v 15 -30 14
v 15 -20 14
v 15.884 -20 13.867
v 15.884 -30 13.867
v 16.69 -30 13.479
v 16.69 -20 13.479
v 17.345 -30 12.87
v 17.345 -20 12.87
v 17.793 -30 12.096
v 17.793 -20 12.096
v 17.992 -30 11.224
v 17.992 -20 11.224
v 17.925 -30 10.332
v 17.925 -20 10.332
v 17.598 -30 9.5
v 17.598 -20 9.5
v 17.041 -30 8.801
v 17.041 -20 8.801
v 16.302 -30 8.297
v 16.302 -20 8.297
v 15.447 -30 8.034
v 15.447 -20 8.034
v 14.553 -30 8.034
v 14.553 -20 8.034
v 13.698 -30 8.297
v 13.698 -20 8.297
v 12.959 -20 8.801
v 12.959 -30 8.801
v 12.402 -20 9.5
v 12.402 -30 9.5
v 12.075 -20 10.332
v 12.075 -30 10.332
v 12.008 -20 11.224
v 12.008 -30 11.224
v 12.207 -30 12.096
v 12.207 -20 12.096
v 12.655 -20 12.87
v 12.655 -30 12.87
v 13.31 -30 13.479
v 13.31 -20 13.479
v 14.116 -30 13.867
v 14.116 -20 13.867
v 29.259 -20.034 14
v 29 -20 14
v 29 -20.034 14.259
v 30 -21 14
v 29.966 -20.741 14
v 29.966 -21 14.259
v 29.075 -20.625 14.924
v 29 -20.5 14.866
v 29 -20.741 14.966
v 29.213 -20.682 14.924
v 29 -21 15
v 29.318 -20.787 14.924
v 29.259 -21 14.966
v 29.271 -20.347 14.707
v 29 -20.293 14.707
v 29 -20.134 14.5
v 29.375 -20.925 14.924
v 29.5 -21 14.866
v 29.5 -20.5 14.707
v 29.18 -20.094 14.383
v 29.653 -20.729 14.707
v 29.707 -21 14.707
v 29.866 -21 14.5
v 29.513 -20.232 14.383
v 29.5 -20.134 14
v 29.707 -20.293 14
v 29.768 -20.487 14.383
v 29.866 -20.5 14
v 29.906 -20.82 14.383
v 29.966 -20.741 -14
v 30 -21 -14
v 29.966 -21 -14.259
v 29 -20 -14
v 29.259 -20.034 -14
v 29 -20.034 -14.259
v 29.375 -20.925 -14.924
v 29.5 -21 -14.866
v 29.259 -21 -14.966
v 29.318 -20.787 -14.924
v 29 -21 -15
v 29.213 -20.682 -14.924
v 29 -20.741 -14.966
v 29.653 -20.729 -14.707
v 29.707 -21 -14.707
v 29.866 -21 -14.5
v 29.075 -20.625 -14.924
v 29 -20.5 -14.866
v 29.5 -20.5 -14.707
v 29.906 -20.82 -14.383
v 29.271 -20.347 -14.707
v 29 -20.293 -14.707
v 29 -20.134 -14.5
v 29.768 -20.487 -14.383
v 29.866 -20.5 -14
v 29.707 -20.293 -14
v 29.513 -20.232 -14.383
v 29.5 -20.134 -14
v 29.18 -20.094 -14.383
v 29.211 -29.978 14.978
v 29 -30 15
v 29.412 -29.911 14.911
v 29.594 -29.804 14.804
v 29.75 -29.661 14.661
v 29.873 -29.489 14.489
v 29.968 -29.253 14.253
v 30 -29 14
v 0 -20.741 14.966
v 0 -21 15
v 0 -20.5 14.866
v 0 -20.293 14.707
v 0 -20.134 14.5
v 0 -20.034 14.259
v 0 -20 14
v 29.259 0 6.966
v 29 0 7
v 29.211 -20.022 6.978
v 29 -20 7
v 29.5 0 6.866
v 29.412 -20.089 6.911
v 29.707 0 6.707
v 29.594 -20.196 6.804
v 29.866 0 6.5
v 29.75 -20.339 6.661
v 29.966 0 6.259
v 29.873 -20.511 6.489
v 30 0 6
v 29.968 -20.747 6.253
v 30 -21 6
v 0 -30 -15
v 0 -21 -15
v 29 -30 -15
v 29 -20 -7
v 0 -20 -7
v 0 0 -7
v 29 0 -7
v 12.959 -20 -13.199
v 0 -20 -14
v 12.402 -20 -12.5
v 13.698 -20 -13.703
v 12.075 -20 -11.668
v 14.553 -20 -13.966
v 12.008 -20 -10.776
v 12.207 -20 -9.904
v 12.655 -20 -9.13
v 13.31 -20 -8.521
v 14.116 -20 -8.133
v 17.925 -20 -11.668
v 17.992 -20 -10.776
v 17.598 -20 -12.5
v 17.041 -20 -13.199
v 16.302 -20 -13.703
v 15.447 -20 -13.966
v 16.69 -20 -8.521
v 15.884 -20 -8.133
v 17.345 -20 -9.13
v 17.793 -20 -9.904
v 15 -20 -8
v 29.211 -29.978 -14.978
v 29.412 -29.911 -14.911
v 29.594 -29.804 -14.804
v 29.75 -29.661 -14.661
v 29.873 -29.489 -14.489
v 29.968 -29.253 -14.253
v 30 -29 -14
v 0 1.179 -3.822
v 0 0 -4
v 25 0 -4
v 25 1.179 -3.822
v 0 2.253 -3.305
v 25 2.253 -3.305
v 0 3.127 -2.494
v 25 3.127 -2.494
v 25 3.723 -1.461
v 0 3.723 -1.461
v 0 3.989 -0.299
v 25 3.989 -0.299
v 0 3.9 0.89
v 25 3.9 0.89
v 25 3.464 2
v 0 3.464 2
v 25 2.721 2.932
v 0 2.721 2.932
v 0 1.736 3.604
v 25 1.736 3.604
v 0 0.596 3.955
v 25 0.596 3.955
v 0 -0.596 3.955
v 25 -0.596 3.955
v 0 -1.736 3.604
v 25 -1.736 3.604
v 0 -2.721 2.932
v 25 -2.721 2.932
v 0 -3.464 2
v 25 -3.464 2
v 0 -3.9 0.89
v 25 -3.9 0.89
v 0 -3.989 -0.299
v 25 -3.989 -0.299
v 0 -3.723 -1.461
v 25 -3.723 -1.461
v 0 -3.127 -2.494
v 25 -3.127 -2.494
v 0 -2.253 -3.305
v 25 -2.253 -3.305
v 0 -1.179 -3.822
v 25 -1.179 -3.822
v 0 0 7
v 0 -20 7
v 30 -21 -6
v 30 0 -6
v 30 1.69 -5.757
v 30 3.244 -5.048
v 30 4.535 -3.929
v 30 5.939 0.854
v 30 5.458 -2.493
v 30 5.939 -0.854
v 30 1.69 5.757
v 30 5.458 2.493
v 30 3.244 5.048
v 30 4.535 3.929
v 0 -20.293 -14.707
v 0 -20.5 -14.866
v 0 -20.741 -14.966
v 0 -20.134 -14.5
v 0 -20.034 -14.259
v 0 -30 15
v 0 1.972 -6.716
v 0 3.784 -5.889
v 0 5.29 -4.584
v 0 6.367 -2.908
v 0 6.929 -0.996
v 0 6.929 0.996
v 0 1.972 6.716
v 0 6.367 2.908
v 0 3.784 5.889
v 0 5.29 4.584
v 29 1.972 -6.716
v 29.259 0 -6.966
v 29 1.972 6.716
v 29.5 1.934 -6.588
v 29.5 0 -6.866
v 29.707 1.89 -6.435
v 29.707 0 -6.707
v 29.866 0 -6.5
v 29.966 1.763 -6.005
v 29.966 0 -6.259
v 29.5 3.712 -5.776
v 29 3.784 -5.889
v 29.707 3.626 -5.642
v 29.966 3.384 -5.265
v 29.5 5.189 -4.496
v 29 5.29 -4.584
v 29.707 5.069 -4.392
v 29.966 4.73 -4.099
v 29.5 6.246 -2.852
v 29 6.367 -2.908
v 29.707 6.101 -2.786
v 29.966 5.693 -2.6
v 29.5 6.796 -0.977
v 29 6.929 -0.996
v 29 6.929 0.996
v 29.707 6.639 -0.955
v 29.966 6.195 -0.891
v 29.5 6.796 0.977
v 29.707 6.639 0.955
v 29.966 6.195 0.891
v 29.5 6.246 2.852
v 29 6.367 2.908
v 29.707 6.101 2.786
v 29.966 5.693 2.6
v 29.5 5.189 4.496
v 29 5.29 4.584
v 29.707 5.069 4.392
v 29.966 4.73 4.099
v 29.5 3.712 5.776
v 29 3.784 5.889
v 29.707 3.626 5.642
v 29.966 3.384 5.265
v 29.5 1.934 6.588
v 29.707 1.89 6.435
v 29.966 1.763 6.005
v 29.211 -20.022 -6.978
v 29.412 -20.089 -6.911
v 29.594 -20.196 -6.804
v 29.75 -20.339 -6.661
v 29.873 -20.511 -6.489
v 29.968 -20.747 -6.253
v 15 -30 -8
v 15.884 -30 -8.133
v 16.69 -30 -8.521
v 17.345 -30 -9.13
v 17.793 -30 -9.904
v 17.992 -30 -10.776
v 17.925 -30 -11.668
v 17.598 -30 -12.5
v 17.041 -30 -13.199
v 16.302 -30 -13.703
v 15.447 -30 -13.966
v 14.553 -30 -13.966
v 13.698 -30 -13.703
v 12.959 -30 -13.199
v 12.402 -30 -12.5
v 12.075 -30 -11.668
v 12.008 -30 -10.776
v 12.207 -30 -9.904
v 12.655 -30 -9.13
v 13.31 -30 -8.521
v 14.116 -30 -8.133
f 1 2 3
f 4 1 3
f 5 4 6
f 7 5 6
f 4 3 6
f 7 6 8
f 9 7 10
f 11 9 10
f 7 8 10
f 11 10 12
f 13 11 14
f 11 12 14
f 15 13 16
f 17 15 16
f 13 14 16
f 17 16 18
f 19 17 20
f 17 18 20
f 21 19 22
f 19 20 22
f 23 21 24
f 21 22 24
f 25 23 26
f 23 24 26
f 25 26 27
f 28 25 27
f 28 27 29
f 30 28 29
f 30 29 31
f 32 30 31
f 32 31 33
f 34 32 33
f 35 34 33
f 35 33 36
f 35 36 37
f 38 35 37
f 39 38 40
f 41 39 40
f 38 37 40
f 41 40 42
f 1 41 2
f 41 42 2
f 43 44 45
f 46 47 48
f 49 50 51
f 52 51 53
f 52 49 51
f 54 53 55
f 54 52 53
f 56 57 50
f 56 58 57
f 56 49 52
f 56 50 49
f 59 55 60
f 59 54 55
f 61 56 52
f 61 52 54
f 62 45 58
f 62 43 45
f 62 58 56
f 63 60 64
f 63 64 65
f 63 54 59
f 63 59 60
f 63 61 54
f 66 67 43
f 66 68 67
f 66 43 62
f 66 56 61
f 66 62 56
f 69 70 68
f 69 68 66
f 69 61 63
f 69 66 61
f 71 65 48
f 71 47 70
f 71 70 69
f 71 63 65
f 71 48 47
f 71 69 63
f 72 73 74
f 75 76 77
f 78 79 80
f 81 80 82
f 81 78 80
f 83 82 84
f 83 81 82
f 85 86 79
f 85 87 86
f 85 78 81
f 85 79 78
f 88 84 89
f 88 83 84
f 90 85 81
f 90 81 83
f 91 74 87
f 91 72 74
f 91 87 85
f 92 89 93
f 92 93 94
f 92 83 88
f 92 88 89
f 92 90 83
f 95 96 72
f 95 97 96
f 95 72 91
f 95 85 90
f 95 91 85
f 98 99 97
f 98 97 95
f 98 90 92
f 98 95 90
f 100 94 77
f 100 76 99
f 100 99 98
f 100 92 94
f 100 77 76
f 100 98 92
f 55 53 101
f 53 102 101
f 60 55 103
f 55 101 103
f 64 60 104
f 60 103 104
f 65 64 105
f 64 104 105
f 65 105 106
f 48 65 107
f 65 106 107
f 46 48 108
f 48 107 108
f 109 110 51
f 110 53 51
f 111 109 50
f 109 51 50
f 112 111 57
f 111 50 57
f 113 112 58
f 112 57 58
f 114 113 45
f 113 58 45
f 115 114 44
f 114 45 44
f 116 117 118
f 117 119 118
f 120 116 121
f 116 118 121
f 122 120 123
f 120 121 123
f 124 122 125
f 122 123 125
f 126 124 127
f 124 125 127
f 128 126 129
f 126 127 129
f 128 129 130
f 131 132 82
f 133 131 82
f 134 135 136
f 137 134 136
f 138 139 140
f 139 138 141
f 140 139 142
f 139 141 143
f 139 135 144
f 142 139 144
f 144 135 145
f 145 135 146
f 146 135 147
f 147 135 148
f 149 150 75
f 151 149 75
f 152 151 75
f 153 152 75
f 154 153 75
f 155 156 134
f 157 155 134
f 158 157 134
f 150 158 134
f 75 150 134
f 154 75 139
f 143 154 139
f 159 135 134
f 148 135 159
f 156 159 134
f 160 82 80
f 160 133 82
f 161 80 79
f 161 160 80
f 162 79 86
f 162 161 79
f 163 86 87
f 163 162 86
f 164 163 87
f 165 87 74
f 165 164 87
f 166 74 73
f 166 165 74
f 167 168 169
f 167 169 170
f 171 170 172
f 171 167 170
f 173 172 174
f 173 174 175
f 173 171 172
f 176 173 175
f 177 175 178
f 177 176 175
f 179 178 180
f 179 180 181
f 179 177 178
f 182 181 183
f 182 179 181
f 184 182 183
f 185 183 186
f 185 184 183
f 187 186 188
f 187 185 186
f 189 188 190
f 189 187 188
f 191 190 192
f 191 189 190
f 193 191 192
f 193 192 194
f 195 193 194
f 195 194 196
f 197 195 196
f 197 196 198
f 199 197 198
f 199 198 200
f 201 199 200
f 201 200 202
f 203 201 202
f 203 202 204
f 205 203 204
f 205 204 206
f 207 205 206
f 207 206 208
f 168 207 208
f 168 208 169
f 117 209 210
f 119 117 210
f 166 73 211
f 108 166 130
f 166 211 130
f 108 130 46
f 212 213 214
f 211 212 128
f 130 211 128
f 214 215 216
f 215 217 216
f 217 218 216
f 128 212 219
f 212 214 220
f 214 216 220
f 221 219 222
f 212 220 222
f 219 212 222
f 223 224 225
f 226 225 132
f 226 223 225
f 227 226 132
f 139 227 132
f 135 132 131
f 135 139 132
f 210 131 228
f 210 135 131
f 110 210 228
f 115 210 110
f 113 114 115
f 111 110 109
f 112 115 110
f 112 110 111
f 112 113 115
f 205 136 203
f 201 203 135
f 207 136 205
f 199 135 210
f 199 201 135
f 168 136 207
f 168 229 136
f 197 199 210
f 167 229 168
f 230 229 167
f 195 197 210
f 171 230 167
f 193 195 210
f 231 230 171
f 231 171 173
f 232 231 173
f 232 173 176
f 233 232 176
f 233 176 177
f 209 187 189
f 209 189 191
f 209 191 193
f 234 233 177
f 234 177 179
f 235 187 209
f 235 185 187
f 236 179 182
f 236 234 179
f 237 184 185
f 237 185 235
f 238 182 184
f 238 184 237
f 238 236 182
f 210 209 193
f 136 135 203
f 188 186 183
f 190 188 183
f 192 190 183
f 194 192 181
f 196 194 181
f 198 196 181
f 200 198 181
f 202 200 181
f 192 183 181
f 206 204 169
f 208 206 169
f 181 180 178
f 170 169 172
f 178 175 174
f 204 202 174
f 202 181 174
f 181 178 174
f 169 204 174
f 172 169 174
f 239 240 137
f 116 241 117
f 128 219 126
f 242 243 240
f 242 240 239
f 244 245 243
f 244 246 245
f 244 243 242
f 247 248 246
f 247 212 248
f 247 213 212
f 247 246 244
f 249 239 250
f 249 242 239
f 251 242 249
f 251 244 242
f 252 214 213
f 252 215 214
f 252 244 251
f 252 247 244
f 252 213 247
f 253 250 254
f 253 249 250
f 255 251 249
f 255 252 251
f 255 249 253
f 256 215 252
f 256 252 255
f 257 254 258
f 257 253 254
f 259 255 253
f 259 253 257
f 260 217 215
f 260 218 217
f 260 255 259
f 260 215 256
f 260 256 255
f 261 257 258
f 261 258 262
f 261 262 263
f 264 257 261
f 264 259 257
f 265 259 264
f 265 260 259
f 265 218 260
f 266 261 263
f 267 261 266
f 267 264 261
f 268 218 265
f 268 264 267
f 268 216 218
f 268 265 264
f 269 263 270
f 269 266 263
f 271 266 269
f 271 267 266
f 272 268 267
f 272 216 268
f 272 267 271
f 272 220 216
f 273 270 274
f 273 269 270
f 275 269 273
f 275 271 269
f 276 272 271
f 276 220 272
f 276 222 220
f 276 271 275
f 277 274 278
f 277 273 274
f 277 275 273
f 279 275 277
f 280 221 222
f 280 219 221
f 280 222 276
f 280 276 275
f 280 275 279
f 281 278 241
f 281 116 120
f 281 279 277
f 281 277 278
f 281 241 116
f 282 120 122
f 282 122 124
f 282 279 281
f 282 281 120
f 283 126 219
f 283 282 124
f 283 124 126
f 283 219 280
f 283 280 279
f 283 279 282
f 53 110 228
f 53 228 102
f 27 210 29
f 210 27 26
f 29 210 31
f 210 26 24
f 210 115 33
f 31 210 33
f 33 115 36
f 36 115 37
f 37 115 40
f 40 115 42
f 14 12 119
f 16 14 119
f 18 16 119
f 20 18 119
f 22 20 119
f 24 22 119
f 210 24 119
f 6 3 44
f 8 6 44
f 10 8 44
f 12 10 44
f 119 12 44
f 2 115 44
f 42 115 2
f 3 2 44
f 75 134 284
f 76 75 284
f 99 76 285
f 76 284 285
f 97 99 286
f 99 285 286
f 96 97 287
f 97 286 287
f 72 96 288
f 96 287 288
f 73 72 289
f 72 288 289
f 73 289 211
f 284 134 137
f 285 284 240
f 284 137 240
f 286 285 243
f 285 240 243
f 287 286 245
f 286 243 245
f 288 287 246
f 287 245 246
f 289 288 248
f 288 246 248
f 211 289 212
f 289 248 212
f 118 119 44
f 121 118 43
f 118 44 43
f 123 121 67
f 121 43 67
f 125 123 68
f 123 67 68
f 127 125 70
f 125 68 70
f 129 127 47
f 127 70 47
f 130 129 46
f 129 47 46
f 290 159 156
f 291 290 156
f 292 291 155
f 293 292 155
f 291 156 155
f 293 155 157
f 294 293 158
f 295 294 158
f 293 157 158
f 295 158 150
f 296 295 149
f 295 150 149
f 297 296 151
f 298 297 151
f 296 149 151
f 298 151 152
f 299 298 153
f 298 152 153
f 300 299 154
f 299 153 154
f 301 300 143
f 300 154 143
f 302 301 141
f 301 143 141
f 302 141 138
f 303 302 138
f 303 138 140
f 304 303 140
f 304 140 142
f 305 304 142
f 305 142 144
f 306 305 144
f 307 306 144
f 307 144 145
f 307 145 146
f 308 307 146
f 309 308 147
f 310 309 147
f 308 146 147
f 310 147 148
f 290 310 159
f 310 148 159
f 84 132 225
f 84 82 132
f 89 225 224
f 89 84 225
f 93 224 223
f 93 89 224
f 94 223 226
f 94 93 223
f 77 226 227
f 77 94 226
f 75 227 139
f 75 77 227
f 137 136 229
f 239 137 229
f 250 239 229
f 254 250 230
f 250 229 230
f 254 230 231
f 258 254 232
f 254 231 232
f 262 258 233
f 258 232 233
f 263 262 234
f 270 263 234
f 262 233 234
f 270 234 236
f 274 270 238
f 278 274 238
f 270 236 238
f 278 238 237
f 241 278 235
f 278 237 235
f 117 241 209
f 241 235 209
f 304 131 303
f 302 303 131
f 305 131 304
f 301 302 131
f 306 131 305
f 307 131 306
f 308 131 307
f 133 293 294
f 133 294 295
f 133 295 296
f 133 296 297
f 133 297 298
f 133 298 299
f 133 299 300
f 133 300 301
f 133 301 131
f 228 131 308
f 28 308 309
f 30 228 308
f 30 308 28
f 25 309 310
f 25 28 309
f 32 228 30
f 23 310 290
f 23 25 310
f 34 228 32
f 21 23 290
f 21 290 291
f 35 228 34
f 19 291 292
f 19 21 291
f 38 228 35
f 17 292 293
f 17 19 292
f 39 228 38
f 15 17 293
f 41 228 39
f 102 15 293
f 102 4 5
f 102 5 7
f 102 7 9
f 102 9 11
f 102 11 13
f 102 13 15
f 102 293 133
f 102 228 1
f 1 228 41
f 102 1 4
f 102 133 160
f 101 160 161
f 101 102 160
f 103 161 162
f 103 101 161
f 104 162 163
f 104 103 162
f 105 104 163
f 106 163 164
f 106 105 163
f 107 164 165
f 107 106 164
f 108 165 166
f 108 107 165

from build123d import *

# Parameters (mm, degrees)
SKETCH1_R           = 4
BOSS_EXTRUDE3_DEPTH = 30
SKETCH3_W           = 30.000000000000004
SKETCH3_H           = 30
BOSS_EXTRUDE4_DEPTH = 10
SKETCH4_R           = 3.0000000000000004
CUT_EXTRUDE1_DEPTH  = 10
BOSS_EXTRUDE5_START = -5
SKETCH5_R           = 4
BOSS_EXTRUDE5_DEPTH = 5
FILLET2_R           = 1


with BuildPart() as part:
    # Sketch1 → Boss-Extrude3 (new body)
    with BuildSketch(Plane(origin=(0, 0, 0), x_dir=(0, 0, -1), z_dir=(1, 0, 0))):
        with BuildLine():
            Line((-6.999999999999999, 0), (-6.9999999999999964, -20))
            Line((-6.9999999999999964, -20), (6.9999999999999964, -20))
            Line((6.9999999999999964, -20), (6.999999999999999, 0))
            ThreePointArc((6.999999999999999, 0), (4.3e-16, 6.999999999999999), (-6.999999999999999, 0))
        make_face()
        Circle(SKETCH1_R, mode=Mode.SUBTRACT)
    extrude(amount=BOSS_EXTRUDE3_DEPTH)

    # Sketch3 → Boss-Extrude4 (add)
    with BuildSketch(Plane.XZ.offset(20)):
        with Locations((15.000000000000002, 1.78e-15)):
            Rectangle(SKETCH3_W, SKETCH3_H)
    extrude(amount=BOSS_EXTRUDE4_DEPTH)

    # Sketch4 → Cut-Extrude1 (cut)
    with BuildSketch(Plane(origin=(0, -20, 0), x_dir=(1, 0, 0), z_dir=(0, 1, 0))):
        with Locations((15, 10.999999999999996)):
            Circle(SKETCH4_R)
        with Locations((15, -11)):
            Circle(SKETCH4_R)
    extrude(amount=-CUT_EXTRUDE1_DEPTH, mode=Mode.SUBTRACT)

    # Sketch5 → Boss-Extrude5 (add)
    with BuildSketch(Plane(origin=(30, 0, 0), x_dir=(0, 0, -1), z_dir=(1, 0, 0)).offset(BOSS_EXTRUDE5_START)):
        Circle(SKETCH5_R)
    extrude(amount=BOSS_EXTRUDE5_DEPTH)

    # Fillet2
    fillet2_edges = [part.edges().sort_by_distance(p)[0] for p in [
        (30, -10, -6.999999999999998),
        (30, -20, -10.999999999999996),
        (30, -25, -14.999999999999998),
        (30, -30, 1.78e-15),
        (30, -25, 15.000000000000002),
        (30, -20, 10.999999999999998),
        (30, -10, 6.999999999999998),
        (30, 6.999999999999999, -1.09e-15),
        (15, -20, -14.999999999999998),
        (15, -20, 15.000000000000002),
    ]]
    fillet(fillet2_edges, radius=FILLET2_R)


solid = part.part
